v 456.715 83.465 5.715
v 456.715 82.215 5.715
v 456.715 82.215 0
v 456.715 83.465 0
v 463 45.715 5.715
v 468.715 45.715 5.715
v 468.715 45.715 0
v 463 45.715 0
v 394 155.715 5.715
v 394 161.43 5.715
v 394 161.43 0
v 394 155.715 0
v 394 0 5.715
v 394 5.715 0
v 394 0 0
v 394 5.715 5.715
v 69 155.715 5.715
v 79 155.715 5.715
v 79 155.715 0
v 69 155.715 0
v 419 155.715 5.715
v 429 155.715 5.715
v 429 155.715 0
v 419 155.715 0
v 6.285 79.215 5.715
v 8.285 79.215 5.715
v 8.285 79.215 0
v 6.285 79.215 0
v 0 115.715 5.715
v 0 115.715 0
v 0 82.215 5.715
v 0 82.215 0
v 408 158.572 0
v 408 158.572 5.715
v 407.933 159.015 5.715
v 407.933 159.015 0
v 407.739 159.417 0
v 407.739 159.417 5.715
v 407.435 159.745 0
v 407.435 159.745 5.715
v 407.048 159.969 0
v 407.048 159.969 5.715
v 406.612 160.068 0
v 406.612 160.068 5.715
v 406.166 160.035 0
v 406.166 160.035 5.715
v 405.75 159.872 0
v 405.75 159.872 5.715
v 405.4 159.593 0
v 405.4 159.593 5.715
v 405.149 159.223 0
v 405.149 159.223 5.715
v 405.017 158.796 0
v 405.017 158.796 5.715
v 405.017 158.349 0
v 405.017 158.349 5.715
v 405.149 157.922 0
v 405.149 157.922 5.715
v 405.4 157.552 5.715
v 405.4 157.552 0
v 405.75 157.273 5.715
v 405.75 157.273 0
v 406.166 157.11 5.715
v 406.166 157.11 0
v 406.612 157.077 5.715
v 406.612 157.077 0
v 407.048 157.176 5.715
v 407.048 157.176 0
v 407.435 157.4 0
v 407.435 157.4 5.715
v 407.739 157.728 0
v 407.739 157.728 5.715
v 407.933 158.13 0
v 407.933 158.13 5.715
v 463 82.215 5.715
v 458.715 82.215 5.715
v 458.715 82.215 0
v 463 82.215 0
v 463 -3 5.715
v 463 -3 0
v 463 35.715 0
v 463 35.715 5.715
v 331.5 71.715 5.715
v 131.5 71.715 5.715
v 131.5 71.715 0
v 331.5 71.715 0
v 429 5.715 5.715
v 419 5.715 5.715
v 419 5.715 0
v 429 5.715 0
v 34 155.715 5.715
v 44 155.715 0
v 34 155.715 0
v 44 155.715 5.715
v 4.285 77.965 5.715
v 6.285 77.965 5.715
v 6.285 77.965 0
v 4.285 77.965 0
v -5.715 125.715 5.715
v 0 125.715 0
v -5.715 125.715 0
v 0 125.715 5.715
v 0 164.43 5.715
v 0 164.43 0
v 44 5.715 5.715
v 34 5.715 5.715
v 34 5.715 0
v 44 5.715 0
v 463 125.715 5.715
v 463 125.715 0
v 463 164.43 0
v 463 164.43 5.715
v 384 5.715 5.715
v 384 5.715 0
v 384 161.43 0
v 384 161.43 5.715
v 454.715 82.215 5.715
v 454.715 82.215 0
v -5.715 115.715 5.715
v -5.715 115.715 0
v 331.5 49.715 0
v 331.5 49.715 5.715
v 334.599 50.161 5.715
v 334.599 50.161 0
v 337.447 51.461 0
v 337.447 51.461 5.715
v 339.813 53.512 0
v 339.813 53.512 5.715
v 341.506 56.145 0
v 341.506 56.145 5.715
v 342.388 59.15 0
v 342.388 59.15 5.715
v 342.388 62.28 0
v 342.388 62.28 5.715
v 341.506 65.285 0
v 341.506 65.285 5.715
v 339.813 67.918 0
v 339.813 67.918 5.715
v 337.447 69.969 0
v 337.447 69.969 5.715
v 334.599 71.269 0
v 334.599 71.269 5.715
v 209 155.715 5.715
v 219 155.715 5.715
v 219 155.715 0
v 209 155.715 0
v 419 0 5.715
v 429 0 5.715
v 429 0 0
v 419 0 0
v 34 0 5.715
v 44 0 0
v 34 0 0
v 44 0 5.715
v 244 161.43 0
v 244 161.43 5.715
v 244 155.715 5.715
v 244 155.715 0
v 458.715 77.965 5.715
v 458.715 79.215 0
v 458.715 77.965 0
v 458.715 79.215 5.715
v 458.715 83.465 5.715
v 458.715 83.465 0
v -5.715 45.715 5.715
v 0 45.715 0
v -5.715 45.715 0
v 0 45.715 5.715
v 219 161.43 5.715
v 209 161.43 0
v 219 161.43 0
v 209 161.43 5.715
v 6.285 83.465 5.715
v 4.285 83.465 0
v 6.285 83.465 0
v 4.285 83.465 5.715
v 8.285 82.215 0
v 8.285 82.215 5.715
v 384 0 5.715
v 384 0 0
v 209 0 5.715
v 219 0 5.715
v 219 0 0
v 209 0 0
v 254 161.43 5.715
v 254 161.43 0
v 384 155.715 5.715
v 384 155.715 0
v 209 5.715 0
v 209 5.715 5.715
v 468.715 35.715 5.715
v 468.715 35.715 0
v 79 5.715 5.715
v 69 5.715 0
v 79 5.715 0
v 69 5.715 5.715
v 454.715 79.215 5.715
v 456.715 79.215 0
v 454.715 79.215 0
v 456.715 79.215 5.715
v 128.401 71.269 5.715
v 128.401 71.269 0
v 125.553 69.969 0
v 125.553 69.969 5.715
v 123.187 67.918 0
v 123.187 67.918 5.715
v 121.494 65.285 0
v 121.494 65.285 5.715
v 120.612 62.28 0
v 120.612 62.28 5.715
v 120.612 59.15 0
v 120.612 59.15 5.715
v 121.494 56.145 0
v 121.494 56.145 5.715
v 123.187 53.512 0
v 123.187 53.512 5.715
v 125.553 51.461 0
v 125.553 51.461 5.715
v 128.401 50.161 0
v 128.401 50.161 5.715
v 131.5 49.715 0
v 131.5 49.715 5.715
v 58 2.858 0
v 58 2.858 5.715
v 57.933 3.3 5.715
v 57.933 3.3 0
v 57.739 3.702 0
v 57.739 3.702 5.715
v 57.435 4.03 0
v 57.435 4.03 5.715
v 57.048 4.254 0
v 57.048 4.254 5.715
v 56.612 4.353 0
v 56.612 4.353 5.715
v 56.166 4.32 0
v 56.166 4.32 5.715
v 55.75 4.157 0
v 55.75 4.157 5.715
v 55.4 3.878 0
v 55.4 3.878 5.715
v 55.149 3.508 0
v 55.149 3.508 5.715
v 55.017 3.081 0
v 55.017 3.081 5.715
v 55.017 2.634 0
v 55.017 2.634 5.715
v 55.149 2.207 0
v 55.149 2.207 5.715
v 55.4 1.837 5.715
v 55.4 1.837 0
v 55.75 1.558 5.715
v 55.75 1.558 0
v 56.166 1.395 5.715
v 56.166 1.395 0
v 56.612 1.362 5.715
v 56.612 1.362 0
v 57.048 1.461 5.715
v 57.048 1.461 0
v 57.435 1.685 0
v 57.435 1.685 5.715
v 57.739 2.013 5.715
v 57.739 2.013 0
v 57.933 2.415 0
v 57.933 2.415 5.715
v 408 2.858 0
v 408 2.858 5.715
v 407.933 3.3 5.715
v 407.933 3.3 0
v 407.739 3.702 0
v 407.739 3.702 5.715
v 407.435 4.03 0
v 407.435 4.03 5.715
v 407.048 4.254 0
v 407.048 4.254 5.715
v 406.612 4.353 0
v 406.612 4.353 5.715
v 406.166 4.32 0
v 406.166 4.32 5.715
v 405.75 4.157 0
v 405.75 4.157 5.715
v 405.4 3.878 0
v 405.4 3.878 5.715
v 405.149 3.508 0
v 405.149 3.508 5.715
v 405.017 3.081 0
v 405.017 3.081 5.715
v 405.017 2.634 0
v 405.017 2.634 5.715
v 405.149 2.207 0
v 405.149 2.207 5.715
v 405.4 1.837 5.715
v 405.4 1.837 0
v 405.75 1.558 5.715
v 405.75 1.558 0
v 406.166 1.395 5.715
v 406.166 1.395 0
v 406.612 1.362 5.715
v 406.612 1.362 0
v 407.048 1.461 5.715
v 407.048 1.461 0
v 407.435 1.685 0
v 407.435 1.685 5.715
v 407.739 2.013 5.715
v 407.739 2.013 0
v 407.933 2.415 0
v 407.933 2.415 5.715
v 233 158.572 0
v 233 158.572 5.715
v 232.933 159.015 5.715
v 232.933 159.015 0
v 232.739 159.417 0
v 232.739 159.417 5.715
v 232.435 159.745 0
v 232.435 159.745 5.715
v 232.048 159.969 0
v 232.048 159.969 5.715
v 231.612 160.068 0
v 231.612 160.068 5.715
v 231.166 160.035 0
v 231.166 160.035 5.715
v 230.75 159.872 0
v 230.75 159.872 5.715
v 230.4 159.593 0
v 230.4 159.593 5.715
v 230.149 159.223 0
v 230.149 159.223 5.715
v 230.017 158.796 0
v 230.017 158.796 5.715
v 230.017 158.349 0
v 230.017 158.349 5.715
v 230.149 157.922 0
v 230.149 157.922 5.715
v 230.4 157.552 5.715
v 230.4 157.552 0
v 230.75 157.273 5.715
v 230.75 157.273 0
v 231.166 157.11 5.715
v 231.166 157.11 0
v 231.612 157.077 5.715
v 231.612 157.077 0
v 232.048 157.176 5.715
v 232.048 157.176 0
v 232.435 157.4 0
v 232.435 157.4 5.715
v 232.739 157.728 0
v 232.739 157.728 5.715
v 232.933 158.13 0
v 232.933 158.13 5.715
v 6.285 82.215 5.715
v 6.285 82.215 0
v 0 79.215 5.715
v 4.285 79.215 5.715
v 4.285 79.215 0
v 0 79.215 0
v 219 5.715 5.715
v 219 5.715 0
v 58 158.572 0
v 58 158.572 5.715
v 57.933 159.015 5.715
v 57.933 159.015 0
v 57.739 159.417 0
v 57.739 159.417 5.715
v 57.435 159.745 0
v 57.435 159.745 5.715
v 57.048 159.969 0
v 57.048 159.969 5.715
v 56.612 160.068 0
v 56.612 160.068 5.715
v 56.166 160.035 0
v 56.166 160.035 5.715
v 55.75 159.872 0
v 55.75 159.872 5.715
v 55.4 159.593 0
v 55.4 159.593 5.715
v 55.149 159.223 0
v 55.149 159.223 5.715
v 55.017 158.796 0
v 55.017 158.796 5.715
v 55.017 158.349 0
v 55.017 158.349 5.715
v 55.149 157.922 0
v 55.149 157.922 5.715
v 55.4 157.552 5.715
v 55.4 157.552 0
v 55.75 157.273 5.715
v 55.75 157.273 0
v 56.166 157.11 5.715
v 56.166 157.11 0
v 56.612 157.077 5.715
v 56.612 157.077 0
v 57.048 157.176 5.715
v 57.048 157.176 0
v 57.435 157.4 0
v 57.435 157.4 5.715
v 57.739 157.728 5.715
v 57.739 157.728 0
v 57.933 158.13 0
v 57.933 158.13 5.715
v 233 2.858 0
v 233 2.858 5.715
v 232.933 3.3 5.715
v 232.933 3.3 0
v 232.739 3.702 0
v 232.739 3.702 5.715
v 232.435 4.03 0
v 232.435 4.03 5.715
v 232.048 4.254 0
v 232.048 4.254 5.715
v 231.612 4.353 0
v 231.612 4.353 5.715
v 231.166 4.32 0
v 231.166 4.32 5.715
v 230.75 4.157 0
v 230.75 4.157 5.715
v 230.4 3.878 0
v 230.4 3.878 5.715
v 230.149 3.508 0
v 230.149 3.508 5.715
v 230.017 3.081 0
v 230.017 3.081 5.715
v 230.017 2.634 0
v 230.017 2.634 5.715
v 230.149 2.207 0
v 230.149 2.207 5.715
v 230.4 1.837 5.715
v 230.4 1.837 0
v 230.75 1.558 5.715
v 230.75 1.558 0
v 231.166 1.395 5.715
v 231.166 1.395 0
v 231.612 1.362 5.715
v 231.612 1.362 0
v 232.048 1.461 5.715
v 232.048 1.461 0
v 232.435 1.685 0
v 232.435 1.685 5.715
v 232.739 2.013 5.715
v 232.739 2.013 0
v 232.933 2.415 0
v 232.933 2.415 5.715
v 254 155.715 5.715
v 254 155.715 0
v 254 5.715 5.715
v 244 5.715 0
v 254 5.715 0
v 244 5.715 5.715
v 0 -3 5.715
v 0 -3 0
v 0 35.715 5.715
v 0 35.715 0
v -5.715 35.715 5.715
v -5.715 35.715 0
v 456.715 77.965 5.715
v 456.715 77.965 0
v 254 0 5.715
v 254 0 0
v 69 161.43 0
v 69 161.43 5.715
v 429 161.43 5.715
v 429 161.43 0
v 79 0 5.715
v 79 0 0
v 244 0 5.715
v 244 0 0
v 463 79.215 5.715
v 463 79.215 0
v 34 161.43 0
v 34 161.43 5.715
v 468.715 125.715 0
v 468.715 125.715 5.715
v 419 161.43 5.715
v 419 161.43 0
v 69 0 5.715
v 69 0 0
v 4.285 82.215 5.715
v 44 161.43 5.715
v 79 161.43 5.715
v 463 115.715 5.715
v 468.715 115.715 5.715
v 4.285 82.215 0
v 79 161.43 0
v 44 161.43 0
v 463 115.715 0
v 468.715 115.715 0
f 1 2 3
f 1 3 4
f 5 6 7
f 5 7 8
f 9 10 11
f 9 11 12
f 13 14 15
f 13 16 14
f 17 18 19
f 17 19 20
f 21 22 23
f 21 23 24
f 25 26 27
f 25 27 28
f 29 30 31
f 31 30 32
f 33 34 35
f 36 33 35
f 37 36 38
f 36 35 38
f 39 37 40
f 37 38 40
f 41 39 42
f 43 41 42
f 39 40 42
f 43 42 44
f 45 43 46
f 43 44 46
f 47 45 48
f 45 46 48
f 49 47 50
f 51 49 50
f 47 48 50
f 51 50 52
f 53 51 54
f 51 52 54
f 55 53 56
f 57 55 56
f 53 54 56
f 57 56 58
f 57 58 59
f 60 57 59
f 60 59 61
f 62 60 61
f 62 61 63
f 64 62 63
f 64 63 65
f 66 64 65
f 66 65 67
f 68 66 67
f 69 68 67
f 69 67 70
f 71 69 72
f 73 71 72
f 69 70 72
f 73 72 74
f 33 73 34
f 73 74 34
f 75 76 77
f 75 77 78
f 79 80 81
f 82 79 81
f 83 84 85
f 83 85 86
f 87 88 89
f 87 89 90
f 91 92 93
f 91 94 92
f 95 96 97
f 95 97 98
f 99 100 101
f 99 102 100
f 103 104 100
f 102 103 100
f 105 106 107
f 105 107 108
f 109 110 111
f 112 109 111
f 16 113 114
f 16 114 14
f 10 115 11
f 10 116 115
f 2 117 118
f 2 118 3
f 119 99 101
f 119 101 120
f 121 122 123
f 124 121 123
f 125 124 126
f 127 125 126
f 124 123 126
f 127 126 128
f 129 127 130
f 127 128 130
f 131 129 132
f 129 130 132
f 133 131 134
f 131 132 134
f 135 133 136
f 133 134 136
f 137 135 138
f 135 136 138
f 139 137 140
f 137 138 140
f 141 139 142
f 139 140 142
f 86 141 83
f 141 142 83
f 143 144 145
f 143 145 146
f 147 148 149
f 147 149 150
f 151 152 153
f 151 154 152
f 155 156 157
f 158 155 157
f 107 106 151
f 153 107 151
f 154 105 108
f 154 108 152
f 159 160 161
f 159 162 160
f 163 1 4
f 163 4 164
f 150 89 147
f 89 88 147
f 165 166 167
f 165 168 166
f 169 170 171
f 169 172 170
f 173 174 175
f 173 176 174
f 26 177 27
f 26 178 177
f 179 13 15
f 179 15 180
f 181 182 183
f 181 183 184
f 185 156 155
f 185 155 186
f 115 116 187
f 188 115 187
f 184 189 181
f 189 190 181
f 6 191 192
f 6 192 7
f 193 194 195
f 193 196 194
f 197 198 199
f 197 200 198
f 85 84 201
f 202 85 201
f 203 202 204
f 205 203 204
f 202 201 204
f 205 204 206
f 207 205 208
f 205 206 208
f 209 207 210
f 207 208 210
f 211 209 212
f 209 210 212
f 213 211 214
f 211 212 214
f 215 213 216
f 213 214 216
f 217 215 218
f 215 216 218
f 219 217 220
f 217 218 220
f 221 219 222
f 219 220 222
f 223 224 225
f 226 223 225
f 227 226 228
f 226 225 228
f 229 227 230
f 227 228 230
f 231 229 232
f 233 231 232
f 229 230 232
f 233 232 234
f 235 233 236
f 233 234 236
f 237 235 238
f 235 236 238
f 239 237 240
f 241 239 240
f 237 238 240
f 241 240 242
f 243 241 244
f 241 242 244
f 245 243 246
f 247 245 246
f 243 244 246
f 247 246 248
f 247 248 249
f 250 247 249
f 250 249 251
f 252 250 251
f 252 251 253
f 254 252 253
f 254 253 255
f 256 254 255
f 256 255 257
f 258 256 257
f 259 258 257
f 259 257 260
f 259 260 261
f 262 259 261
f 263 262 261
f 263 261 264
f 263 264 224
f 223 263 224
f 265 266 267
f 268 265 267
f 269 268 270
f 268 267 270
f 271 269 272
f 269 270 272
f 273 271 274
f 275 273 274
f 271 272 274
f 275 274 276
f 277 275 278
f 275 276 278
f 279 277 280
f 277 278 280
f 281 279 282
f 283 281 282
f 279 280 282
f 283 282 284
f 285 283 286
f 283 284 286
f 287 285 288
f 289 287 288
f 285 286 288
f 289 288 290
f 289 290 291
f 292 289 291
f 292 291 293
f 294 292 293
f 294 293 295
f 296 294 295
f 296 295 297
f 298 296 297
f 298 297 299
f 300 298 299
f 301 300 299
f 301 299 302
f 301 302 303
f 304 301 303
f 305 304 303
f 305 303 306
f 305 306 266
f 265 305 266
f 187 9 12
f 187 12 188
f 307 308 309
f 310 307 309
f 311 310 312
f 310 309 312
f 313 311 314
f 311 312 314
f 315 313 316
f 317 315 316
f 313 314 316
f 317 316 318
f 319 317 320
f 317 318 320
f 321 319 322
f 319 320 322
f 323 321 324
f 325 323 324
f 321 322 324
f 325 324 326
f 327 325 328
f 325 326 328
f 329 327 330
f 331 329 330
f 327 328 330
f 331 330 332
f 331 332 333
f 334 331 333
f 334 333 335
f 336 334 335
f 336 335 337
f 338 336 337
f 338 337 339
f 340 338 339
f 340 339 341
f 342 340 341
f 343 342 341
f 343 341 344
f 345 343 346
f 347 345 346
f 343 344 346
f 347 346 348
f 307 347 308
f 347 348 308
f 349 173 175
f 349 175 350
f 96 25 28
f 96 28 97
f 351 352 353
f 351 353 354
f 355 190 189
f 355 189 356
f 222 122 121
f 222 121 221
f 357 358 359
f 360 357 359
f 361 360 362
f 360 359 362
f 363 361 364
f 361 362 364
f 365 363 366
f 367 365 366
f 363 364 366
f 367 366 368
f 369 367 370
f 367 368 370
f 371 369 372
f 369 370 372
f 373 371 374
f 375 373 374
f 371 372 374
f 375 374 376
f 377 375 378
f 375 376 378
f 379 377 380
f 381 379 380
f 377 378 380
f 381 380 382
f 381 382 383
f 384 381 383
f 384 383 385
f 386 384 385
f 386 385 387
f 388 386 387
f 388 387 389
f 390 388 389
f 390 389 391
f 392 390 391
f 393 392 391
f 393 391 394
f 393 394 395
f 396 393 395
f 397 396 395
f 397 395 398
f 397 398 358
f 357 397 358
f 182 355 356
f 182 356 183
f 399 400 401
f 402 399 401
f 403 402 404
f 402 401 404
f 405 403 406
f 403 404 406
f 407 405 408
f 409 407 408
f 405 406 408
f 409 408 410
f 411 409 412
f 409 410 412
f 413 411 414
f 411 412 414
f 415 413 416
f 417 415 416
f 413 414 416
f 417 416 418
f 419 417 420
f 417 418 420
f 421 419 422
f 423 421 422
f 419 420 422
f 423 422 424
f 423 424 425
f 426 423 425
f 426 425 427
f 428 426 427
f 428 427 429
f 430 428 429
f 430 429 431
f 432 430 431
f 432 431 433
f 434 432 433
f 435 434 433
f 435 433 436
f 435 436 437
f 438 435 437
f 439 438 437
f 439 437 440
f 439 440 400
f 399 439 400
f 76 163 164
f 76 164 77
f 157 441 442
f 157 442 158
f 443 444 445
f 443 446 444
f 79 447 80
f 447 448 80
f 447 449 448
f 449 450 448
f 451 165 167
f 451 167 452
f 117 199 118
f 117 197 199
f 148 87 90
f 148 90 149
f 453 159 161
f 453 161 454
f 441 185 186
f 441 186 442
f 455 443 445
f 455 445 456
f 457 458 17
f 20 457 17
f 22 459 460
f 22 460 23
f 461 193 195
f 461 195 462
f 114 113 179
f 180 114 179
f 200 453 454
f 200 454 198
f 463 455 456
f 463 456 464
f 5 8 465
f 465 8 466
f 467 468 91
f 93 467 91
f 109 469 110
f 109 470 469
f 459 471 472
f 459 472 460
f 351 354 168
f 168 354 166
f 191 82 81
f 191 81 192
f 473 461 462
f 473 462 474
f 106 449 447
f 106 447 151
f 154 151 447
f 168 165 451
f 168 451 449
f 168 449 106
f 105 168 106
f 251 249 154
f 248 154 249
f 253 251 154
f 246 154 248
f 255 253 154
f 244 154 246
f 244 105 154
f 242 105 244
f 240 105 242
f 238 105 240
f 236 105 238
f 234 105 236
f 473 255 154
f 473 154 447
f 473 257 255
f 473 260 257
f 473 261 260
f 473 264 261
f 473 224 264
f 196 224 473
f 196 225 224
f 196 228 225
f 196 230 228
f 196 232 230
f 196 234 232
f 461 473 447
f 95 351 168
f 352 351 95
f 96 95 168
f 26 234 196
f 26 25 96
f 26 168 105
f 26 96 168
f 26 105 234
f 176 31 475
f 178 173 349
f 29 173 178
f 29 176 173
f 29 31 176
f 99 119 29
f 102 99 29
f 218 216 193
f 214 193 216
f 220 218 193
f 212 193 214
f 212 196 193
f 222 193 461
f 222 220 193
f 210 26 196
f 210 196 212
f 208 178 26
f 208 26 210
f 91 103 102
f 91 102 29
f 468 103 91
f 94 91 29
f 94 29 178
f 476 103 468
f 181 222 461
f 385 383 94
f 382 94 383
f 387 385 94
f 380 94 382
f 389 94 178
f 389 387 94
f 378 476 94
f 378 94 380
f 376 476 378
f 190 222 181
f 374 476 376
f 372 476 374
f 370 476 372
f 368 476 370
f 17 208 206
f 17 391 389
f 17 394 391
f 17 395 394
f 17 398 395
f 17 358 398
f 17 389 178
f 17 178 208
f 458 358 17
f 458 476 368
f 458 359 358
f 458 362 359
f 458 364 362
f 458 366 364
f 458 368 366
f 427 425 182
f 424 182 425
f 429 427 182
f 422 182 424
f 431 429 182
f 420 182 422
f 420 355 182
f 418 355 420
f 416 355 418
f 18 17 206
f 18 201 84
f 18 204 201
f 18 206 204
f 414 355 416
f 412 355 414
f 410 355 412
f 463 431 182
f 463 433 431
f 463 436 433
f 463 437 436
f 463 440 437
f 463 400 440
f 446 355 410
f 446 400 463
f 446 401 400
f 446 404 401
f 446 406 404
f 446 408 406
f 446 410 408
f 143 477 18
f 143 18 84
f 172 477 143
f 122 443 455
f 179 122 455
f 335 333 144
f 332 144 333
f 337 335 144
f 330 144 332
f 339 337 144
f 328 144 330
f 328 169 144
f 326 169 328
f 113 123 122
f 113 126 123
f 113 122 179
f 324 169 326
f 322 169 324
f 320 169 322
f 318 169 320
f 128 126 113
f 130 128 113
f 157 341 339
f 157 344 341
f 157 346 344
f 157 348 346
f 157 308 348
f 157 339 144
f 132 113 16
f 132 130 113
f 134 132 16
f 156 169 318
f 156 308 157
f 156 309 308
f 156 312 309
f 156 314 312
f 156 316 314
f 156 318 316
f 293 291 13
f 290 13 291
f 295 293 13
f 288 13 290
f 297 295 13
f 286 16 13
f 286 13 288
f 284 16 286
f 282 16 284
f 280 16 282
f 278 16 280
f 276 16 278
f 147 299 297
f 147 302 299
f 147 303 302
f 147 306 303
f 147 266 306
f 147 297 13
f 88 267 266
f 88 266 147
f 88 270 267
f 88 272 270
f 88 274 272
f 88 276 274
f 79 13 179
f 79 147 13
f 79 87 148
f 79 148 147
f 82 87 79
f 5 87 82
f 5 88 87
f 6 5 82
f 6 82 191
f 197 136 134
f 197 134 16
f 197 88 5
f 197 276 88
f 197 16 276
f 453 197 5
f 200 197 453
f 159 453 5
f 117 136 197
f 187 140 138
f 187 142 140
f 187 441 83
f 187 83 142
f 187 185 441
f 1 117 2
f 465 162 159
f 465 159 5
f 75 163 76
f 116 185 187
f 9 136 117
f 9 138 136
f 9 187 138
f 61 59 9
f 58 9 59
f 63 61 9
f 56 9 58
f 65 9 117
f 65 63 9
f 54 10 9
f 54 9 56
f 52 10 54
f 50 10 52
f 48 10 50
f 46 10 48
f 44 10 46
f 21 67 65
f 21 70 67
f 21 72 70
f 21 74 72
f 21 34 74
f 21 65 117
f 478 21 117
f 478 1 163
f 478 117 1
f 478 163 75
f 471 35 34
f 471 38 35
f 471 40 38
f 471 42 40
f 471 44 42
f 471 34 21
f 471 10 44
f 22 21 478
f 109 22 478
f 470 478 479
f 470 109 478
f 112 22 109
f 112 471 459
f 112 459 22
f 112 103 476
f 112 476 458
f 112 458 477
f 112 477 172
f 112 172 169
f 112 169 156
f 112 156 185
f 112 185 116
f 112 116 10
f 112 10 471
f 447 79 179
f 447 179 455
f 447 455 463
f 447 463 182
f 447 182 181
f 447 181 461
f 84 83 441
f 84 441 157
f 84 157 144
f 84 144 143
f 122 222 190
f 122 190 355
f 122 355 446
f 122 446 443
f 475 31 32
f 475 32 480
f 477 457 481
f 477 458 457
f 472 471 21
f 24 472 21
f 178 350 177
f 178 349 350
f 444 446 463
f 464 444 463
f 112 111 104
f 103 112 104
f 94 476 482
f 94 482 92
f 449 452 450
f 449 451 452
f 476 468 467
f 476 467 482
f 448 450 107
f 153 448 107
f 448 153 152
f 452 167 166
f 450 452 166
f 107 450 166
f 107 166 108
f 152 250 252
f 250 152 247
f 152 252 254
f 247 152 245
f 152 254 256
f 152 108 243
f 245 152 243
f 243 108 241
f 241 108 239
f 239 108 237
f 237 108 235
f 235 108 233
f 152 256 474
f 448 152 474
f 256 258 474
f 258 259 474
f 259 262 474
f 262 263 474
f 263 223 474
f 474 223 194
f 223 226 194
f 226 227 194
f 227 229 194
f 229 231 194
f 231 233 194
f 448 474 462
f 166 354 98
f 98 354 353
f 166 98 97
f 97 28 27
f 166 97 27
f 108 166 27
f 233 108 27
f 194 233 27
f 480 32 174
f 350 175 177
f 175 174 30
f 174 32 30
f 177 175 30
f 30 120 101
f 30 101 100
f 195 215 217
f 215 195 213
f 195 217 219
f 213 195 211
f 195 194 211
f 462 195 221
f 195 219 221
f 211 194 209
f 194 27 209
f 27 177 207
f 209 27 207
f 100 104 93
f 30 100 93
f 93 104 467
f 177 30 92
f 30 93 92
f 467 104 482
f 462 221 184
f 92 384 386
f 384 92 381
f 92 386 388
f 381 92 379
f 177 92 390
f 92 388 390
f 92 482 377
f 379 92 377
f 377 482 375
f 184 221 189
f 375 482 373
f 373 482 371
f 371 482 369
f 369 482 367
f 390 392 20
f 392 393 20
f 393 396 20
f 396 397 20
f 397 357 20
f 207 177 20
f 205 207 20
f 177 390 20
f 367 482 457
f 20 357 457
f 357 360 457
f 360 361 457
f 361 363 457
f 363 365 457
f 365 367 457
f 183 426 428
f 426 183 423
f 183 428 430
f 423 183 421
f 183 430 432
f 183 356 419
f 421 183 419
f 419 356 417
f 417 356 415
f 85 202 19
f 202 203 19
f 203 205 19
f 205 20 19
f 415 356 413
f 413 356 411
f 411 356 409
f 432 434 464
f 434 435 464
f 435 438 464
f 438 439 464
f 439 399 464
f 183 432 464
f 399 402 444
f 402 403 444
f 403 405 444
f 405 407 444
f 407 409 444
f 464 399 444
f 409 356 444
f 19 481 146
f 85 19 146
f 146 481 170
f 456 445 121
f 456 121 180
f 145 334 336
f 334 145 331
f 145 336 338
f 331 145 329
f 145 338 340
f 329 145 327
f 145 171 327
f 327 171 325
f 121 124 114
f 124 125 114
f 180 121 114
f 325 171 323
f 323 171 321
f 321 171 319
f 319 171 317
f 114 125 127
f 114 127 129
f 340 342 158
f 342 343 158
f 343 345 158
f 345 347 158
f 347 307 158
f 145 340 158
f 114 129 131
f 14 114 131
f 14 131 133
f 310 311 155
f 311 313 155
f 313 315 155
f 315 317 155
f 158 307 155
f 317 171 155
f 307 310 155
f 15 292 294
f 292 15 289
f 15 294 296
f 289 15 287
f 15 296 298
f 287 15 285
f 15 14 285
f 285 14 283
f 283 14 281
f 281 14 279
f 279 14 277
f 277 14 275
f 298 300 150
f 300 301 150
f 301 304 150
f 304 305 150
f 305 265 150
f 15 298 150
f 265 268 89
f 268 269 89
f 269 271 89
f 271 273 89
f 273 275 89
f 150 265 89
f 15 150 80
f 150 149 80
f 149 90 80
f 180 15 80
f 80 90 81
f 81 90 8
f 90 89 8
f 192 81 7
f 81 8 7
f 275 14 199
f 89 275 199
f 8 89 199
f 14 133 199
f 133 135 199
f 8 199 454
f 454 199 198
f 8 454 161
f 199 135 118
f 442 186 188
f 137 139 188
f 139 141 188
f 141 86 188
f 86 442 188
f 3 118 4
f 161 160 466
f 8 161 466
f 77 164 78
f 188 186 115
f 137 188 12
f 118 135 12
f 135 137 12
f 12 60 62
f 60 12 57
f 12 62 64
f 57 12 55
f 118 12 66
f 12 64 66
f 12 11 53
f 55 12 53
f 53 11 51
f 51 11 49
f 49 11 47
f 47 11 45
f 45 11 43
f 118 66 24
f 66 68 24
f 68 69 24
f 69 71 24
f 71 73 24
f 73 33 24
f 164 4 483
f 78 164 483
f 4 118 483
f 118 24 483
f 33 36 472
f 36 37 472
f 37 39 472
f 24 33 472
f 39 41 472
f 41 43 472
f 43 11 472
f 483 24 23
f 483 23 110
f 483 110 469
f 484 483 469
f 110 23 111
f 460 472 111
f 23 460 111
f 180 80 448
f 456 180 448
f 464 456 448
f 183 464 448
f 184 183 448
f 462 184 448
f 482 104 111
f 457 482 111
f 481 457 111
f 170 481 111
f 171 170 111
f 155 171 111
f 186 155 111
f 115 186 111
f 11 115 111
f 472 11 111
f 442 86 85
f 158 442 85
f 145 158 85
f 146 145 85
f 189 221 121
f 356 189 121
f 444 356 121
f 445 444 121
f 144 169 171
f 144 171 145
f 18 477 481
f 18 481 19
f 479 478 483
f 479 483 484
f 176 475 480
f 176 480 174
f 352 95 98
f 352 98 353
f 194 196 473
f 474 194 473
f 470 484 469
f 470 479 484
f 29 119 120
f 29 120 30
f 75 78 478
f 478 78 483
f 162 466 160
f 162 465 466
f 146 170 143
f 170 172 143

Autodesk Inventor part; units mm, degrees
ref_plane "YZ Plane" through (0, 0, 0) normal (1, 0, 0) x (0, 1, 0)
ref_plane "XZ Plane" through (0, 0, 0) normal (0, 1, 0) x (-1, 0, 0)
ref_plane "XY Plane" through (0, 0, 0) normal (0, 0, 1) x (1, 0, 0)
sketch "Sketch1" plane through (0, 0, 0) normal (0, 0, 1) x (1, 0, 0)
  line L0 (463, 164.43) -> (0, 164.43)
  line L1 (0, 164.43) -> (0, -3)
  line L2 (0, -3) -> (463, -3)
  line L3 (463, -3) -> (463, 164.43)
  point P0 (0, 0)
  point P1 (463, 161.43)
  dimension "d0" = 3
  dimension "d1" = 3
extrude "Extrusion1" add sketch "Sketch1" along normal blind 5.715
sketch "Sketch2" plane through (0, 0, 5.715) normal (0, 0, 1) x (1, 0, 0)
  line L0 (463, 164.43) -> (0, 164.43) projected
  line L1 (0, 164.43) -> (0, -3) projected
  line L2 (0, -3) -> (463, -3) projected
  line L3 (463, -3) -> (463, 164.43) projected
  line L4 (44, 0) -> (34, 0) projected
  line L5 (44, 5.715) -> (44, 0) projected
  line L6 (34, 5.715) -> (44, 5.715) projected
  line L7 (34, 5.715) -> (34, 0) projected
  line L8 (79, 0) -> (69, 0) projected
  line L9 (79, 5.715) -> (79, 0) projected
  line L10 (69, 5.715) -> (79, 5.715) projected
  line L11 (69, 5.715) -> (69, 0) projected
  line L12 (219, 0) -> (209, 0) projected
  line L13 (219, 5.715) -> (219, 0) projected
  line L14 (209, 5.715) -> (219, 5.715) projected
  line L15 (209, 5.715) -> (209, 0) projected
  line L16 (254, 0) -> (244, 0) projected
  line L17 (254, 5.715) -> (254, 0) projected
  line L18 (244, 5.715) -> (254, 5.715) projected
  line L19 (244, 5.715) -> (244, 0) projected
  line L20 (394, 0) -> (384, 0) projected
  line L21 (394, 5.715) -> (394, 0) projected
  line L22 (384, 5.715) -> (394, 5.715) projected
  line L23 (384, 5.715) -> (384, 0) projected
  line L24 (429, 0) -> (419, 0) projected
  line L25 (429, 5.715) -> (429, 0) projected
  line L26 (419, 5.715) -> (429, 5.715) projected
  line L27 (419, 5.715) -> (419, 0) projected
  line L28 (429, 155.715) -> (419, 155.715) projected
  line L29 (429, 161.43) -> (429, 155.715) projected
  line L30 (419, 161.43) -> (429, 161.43) projected
  line L31 (419, 161.43) -> (419, 155.715) projected
  line L32 (394, 155.715) -> (384, 155.715) projected
  line L33 (394, 161.43) -> (394, 155.715) projected
  line L34 (384, 161.43) -> (394, 161.43) projected
  line L35 (384, 161.43) -> (384, 155.715) projected
  line L36 (254, 155.715) -> (244, 155.715) projected
  line L37 (254, 161.43) -> (254, 155.715) projected
  line L38 (244, 161.43) -> (254, 161.43) projected
  line L39 (244, 161.43) -> (244, 155.715) projected
  line L40 (219, 155.715) -> (209, 155.715) projected
  line L41 (219, 161.43) -> (219, 155.715) projected
  line L42 (209, 161.43) -> (219, 161.43) projected
  line L43 (209, 161.43) -> (209, 155.715) projected
  line L44 (79, 155.715) -> (69, 155.715) projected
  line L45 (79, 161.43) -> (79, 155.715) projected
  line L46 (69, 161.43) -> (79, 161.43) projected
  line L47 (69, 161.43) -> (69, 155.715) projected
  line L48 (44, 155.715) -> (34, 155.715) projected
  line L49 (44, 161.43) -> (44, 155.715) projected
  line L50 (34, 161.43) -> (44, 161.43) projected
  line L51 (34, 161.43) -> (34, 155.715) projected
  point P0 (0, 0)
extrude "Extrusion2" cut sketch "Sketch2" against normal through all keep common part
sketch "Sketch3" plane through (0, 0, 5.715) normal (0, 0, 1) x (1, 0, 0)
  line L0 (44, 155.715) -> (44, 161.43) projected
  line L1 (69, 161.43) -> (69, 155.715) projected
  line L2 (219, 155.715) -> (219, 161.43) projected
  line L3 (244, 161.43) -> (244, 155.715) projected
  line L4 (394, 155.715) -> (394, 161.43) projected
  line L5 (419, 161.43) -> (419, 155.715) projected
  line L6 (419, 5.715) -> (419, 0) projected
  line L7 (394, 0) -> (394, 5.715) projected
  line L8 (244, 5.715) -> (244, 0) projected
  line L9 (219, 0) -> (219, 5.715) projected
  line L10 (69, 5.715) -> (69, 0) projected
  line L11 (44, 0) -> (44, 5.715) projected
  line L12 (44, 158.5725) -> (69, 158.5725) construction
  circle A0 centre (56.5, 158.5725) radius 1.5
  line L13 (219, 158.5725) -> (244, 158.5725) construction
  circle A1 centre (231.5, 158.5725) radius 1.5
  line L14 (394, 158.5725) -> (419, 158.5725) construction
  circle A2 centre (406.5, 158.5725) radius 1.5
  line L15 (44, 2.8575) -> (69, 2.8575) construction
  circle A3 centre (56.5, 2.8575) radius 1.5
  line L16 (219, 2.8575) -> (244, 2.8575) construction
  circle A4 centre (231.5, 2.8575) radius 1.5
  line L17 (394, 2.8575) -> (419, 2.8575) construction
  circle A5 centre (406.5, 2.8575) radius 1.5
  point P0 (0, 0)
  dimension "d6" = 3
  dimension "d8" = 3
  dimension "d9" = 3
  dimension "d10" = 3
  dimension "d11" = 3
  dimension "d12" = 3
extrude "Extrusion3" cut sketch "Sketch3" against normal through all
sketch "Sketch4" plane through (0, 0, 5.715) normal (0, 0, 1) x (1, 0, 0)
  line L0 (0, 164.43) -> (0, -3) projected
  line L1 (0, 82.215) -> (8.285, 82.215)
  line L2 (8.285, 82.215) -> (8.285, 79.215)
  line L3 (8.285, 79.215) -> (0, 79.215)
  line L4 (0, 79.215) -> (0, 82.215)
  line L5 (4.285, 83.465) -> (6.285, 83.465)
  line L6 (6.285, 83.465) -> (6.285, 77.965)
  line L7 (6.285, 77.965) -> (4.285, 77.965)
  line L8 (4.285, 77.965) -> (4.285, 83.465)
  point P0 (0, 0)
  point P1 (0, 80.715)
  point P2 (6.285, 80.715)
  point P3 (8.285, 80.715)
  dimension "d15" = 3
  dimension "d17" = 5.5
  dimension "d18" = 6.285
  dimension "d19" = 2
  dimension "d20" = 8.285
extrude "Extrusion4" cut sketch "Sketch4" against normal through all
ref_plane "Work Plane1" through (231.5, 164.43, 0) normal (-1, 0, 0) x (0, 0, 1)
sketch "Sketch5" plane through (0, 0, 5.715) normal (0, 0, 1) x (1, 0, 0)
  line L0 (0, 79.215) -> (0, -3) projected
  line L1 (0, 164.43) -> (0, 82.215) projected
  line L2 (8.285, 82.215) -> (8.285, 79.215) projected
  line L3 (0, 125.715) -> (-5.715, 125.715)
  line L4 (-5.715, 125.715) -> (-5.715, 115.715)
  line L5 (-5.715, 115.715) -> (0, 115.715)
  line L6 (0, 115.715) -> (0, 125.715)
  line L7 (0, 45.715) -> (-5.715, 45.715)
  line L8 (-5.715, 45.715) -> (-5.715, 35.715)
  line L9 (-5.715, 35.715) -> (0, 35.715)
  line L10 (0, 35.715) -> (0, 45.715)
  line L11 (-5.715, 45.715) -> (-5.715, 115.715)
  point P0 (0, 0)
  point P1 (8.285, 80.715)
  point P2 (-5.715, 80.715)
  point P3 (8.285, 80.715)
  dimension "d23" = 35
  dimension "d26" = 5.715
  dimension "d27" = 10
extrude "Extrusion5" add sketch "Sketch5" against normal up to surface (5.715 mm away)
mirror "Mirror1" about plane through (231.5, 164.43, 0) normal (-1, 0, 0) of "Extrusion5", "Extrusion4"
sketch "Sketch6" plane through (0, 0, 5.715) normal (0, 0, 1) x (1, 0, 0)
  circle A0 centre (231.5, 2.8575) radius 1.5 projected
  line L0 (356, 95.715) -> (341, 95.715) projected
  line L1 (341, 25.715) -> (356, 25.715) projected
  line L2 (348.5, 25.715) -> (348.5, 95.715)
  line L3 (331.5, 49.715) -> (131.5, 49.715)
  arc A1 (131.5, 71.715) -> (131.5, 49.715) centre (131.5, 60.715) ccw
  line L4 (131.5, 71.715) -> (331.5, 71.715)
  arc A2 (331.5, 49.715) -> (331.5, 71.715) centre (331.5, 60.715) ccw
  point P0 (0, 0)
  point P1 (231.5, 49.715)
  point P2 (348.5, 60.715)
  dimension "d30" = 200
  dimension "d32" = 22
extrude "Extrusion6" cut sketch "Sketch6" against normal through all contours L3 A1 L4 A2
properties part number "TOP PLATE"
